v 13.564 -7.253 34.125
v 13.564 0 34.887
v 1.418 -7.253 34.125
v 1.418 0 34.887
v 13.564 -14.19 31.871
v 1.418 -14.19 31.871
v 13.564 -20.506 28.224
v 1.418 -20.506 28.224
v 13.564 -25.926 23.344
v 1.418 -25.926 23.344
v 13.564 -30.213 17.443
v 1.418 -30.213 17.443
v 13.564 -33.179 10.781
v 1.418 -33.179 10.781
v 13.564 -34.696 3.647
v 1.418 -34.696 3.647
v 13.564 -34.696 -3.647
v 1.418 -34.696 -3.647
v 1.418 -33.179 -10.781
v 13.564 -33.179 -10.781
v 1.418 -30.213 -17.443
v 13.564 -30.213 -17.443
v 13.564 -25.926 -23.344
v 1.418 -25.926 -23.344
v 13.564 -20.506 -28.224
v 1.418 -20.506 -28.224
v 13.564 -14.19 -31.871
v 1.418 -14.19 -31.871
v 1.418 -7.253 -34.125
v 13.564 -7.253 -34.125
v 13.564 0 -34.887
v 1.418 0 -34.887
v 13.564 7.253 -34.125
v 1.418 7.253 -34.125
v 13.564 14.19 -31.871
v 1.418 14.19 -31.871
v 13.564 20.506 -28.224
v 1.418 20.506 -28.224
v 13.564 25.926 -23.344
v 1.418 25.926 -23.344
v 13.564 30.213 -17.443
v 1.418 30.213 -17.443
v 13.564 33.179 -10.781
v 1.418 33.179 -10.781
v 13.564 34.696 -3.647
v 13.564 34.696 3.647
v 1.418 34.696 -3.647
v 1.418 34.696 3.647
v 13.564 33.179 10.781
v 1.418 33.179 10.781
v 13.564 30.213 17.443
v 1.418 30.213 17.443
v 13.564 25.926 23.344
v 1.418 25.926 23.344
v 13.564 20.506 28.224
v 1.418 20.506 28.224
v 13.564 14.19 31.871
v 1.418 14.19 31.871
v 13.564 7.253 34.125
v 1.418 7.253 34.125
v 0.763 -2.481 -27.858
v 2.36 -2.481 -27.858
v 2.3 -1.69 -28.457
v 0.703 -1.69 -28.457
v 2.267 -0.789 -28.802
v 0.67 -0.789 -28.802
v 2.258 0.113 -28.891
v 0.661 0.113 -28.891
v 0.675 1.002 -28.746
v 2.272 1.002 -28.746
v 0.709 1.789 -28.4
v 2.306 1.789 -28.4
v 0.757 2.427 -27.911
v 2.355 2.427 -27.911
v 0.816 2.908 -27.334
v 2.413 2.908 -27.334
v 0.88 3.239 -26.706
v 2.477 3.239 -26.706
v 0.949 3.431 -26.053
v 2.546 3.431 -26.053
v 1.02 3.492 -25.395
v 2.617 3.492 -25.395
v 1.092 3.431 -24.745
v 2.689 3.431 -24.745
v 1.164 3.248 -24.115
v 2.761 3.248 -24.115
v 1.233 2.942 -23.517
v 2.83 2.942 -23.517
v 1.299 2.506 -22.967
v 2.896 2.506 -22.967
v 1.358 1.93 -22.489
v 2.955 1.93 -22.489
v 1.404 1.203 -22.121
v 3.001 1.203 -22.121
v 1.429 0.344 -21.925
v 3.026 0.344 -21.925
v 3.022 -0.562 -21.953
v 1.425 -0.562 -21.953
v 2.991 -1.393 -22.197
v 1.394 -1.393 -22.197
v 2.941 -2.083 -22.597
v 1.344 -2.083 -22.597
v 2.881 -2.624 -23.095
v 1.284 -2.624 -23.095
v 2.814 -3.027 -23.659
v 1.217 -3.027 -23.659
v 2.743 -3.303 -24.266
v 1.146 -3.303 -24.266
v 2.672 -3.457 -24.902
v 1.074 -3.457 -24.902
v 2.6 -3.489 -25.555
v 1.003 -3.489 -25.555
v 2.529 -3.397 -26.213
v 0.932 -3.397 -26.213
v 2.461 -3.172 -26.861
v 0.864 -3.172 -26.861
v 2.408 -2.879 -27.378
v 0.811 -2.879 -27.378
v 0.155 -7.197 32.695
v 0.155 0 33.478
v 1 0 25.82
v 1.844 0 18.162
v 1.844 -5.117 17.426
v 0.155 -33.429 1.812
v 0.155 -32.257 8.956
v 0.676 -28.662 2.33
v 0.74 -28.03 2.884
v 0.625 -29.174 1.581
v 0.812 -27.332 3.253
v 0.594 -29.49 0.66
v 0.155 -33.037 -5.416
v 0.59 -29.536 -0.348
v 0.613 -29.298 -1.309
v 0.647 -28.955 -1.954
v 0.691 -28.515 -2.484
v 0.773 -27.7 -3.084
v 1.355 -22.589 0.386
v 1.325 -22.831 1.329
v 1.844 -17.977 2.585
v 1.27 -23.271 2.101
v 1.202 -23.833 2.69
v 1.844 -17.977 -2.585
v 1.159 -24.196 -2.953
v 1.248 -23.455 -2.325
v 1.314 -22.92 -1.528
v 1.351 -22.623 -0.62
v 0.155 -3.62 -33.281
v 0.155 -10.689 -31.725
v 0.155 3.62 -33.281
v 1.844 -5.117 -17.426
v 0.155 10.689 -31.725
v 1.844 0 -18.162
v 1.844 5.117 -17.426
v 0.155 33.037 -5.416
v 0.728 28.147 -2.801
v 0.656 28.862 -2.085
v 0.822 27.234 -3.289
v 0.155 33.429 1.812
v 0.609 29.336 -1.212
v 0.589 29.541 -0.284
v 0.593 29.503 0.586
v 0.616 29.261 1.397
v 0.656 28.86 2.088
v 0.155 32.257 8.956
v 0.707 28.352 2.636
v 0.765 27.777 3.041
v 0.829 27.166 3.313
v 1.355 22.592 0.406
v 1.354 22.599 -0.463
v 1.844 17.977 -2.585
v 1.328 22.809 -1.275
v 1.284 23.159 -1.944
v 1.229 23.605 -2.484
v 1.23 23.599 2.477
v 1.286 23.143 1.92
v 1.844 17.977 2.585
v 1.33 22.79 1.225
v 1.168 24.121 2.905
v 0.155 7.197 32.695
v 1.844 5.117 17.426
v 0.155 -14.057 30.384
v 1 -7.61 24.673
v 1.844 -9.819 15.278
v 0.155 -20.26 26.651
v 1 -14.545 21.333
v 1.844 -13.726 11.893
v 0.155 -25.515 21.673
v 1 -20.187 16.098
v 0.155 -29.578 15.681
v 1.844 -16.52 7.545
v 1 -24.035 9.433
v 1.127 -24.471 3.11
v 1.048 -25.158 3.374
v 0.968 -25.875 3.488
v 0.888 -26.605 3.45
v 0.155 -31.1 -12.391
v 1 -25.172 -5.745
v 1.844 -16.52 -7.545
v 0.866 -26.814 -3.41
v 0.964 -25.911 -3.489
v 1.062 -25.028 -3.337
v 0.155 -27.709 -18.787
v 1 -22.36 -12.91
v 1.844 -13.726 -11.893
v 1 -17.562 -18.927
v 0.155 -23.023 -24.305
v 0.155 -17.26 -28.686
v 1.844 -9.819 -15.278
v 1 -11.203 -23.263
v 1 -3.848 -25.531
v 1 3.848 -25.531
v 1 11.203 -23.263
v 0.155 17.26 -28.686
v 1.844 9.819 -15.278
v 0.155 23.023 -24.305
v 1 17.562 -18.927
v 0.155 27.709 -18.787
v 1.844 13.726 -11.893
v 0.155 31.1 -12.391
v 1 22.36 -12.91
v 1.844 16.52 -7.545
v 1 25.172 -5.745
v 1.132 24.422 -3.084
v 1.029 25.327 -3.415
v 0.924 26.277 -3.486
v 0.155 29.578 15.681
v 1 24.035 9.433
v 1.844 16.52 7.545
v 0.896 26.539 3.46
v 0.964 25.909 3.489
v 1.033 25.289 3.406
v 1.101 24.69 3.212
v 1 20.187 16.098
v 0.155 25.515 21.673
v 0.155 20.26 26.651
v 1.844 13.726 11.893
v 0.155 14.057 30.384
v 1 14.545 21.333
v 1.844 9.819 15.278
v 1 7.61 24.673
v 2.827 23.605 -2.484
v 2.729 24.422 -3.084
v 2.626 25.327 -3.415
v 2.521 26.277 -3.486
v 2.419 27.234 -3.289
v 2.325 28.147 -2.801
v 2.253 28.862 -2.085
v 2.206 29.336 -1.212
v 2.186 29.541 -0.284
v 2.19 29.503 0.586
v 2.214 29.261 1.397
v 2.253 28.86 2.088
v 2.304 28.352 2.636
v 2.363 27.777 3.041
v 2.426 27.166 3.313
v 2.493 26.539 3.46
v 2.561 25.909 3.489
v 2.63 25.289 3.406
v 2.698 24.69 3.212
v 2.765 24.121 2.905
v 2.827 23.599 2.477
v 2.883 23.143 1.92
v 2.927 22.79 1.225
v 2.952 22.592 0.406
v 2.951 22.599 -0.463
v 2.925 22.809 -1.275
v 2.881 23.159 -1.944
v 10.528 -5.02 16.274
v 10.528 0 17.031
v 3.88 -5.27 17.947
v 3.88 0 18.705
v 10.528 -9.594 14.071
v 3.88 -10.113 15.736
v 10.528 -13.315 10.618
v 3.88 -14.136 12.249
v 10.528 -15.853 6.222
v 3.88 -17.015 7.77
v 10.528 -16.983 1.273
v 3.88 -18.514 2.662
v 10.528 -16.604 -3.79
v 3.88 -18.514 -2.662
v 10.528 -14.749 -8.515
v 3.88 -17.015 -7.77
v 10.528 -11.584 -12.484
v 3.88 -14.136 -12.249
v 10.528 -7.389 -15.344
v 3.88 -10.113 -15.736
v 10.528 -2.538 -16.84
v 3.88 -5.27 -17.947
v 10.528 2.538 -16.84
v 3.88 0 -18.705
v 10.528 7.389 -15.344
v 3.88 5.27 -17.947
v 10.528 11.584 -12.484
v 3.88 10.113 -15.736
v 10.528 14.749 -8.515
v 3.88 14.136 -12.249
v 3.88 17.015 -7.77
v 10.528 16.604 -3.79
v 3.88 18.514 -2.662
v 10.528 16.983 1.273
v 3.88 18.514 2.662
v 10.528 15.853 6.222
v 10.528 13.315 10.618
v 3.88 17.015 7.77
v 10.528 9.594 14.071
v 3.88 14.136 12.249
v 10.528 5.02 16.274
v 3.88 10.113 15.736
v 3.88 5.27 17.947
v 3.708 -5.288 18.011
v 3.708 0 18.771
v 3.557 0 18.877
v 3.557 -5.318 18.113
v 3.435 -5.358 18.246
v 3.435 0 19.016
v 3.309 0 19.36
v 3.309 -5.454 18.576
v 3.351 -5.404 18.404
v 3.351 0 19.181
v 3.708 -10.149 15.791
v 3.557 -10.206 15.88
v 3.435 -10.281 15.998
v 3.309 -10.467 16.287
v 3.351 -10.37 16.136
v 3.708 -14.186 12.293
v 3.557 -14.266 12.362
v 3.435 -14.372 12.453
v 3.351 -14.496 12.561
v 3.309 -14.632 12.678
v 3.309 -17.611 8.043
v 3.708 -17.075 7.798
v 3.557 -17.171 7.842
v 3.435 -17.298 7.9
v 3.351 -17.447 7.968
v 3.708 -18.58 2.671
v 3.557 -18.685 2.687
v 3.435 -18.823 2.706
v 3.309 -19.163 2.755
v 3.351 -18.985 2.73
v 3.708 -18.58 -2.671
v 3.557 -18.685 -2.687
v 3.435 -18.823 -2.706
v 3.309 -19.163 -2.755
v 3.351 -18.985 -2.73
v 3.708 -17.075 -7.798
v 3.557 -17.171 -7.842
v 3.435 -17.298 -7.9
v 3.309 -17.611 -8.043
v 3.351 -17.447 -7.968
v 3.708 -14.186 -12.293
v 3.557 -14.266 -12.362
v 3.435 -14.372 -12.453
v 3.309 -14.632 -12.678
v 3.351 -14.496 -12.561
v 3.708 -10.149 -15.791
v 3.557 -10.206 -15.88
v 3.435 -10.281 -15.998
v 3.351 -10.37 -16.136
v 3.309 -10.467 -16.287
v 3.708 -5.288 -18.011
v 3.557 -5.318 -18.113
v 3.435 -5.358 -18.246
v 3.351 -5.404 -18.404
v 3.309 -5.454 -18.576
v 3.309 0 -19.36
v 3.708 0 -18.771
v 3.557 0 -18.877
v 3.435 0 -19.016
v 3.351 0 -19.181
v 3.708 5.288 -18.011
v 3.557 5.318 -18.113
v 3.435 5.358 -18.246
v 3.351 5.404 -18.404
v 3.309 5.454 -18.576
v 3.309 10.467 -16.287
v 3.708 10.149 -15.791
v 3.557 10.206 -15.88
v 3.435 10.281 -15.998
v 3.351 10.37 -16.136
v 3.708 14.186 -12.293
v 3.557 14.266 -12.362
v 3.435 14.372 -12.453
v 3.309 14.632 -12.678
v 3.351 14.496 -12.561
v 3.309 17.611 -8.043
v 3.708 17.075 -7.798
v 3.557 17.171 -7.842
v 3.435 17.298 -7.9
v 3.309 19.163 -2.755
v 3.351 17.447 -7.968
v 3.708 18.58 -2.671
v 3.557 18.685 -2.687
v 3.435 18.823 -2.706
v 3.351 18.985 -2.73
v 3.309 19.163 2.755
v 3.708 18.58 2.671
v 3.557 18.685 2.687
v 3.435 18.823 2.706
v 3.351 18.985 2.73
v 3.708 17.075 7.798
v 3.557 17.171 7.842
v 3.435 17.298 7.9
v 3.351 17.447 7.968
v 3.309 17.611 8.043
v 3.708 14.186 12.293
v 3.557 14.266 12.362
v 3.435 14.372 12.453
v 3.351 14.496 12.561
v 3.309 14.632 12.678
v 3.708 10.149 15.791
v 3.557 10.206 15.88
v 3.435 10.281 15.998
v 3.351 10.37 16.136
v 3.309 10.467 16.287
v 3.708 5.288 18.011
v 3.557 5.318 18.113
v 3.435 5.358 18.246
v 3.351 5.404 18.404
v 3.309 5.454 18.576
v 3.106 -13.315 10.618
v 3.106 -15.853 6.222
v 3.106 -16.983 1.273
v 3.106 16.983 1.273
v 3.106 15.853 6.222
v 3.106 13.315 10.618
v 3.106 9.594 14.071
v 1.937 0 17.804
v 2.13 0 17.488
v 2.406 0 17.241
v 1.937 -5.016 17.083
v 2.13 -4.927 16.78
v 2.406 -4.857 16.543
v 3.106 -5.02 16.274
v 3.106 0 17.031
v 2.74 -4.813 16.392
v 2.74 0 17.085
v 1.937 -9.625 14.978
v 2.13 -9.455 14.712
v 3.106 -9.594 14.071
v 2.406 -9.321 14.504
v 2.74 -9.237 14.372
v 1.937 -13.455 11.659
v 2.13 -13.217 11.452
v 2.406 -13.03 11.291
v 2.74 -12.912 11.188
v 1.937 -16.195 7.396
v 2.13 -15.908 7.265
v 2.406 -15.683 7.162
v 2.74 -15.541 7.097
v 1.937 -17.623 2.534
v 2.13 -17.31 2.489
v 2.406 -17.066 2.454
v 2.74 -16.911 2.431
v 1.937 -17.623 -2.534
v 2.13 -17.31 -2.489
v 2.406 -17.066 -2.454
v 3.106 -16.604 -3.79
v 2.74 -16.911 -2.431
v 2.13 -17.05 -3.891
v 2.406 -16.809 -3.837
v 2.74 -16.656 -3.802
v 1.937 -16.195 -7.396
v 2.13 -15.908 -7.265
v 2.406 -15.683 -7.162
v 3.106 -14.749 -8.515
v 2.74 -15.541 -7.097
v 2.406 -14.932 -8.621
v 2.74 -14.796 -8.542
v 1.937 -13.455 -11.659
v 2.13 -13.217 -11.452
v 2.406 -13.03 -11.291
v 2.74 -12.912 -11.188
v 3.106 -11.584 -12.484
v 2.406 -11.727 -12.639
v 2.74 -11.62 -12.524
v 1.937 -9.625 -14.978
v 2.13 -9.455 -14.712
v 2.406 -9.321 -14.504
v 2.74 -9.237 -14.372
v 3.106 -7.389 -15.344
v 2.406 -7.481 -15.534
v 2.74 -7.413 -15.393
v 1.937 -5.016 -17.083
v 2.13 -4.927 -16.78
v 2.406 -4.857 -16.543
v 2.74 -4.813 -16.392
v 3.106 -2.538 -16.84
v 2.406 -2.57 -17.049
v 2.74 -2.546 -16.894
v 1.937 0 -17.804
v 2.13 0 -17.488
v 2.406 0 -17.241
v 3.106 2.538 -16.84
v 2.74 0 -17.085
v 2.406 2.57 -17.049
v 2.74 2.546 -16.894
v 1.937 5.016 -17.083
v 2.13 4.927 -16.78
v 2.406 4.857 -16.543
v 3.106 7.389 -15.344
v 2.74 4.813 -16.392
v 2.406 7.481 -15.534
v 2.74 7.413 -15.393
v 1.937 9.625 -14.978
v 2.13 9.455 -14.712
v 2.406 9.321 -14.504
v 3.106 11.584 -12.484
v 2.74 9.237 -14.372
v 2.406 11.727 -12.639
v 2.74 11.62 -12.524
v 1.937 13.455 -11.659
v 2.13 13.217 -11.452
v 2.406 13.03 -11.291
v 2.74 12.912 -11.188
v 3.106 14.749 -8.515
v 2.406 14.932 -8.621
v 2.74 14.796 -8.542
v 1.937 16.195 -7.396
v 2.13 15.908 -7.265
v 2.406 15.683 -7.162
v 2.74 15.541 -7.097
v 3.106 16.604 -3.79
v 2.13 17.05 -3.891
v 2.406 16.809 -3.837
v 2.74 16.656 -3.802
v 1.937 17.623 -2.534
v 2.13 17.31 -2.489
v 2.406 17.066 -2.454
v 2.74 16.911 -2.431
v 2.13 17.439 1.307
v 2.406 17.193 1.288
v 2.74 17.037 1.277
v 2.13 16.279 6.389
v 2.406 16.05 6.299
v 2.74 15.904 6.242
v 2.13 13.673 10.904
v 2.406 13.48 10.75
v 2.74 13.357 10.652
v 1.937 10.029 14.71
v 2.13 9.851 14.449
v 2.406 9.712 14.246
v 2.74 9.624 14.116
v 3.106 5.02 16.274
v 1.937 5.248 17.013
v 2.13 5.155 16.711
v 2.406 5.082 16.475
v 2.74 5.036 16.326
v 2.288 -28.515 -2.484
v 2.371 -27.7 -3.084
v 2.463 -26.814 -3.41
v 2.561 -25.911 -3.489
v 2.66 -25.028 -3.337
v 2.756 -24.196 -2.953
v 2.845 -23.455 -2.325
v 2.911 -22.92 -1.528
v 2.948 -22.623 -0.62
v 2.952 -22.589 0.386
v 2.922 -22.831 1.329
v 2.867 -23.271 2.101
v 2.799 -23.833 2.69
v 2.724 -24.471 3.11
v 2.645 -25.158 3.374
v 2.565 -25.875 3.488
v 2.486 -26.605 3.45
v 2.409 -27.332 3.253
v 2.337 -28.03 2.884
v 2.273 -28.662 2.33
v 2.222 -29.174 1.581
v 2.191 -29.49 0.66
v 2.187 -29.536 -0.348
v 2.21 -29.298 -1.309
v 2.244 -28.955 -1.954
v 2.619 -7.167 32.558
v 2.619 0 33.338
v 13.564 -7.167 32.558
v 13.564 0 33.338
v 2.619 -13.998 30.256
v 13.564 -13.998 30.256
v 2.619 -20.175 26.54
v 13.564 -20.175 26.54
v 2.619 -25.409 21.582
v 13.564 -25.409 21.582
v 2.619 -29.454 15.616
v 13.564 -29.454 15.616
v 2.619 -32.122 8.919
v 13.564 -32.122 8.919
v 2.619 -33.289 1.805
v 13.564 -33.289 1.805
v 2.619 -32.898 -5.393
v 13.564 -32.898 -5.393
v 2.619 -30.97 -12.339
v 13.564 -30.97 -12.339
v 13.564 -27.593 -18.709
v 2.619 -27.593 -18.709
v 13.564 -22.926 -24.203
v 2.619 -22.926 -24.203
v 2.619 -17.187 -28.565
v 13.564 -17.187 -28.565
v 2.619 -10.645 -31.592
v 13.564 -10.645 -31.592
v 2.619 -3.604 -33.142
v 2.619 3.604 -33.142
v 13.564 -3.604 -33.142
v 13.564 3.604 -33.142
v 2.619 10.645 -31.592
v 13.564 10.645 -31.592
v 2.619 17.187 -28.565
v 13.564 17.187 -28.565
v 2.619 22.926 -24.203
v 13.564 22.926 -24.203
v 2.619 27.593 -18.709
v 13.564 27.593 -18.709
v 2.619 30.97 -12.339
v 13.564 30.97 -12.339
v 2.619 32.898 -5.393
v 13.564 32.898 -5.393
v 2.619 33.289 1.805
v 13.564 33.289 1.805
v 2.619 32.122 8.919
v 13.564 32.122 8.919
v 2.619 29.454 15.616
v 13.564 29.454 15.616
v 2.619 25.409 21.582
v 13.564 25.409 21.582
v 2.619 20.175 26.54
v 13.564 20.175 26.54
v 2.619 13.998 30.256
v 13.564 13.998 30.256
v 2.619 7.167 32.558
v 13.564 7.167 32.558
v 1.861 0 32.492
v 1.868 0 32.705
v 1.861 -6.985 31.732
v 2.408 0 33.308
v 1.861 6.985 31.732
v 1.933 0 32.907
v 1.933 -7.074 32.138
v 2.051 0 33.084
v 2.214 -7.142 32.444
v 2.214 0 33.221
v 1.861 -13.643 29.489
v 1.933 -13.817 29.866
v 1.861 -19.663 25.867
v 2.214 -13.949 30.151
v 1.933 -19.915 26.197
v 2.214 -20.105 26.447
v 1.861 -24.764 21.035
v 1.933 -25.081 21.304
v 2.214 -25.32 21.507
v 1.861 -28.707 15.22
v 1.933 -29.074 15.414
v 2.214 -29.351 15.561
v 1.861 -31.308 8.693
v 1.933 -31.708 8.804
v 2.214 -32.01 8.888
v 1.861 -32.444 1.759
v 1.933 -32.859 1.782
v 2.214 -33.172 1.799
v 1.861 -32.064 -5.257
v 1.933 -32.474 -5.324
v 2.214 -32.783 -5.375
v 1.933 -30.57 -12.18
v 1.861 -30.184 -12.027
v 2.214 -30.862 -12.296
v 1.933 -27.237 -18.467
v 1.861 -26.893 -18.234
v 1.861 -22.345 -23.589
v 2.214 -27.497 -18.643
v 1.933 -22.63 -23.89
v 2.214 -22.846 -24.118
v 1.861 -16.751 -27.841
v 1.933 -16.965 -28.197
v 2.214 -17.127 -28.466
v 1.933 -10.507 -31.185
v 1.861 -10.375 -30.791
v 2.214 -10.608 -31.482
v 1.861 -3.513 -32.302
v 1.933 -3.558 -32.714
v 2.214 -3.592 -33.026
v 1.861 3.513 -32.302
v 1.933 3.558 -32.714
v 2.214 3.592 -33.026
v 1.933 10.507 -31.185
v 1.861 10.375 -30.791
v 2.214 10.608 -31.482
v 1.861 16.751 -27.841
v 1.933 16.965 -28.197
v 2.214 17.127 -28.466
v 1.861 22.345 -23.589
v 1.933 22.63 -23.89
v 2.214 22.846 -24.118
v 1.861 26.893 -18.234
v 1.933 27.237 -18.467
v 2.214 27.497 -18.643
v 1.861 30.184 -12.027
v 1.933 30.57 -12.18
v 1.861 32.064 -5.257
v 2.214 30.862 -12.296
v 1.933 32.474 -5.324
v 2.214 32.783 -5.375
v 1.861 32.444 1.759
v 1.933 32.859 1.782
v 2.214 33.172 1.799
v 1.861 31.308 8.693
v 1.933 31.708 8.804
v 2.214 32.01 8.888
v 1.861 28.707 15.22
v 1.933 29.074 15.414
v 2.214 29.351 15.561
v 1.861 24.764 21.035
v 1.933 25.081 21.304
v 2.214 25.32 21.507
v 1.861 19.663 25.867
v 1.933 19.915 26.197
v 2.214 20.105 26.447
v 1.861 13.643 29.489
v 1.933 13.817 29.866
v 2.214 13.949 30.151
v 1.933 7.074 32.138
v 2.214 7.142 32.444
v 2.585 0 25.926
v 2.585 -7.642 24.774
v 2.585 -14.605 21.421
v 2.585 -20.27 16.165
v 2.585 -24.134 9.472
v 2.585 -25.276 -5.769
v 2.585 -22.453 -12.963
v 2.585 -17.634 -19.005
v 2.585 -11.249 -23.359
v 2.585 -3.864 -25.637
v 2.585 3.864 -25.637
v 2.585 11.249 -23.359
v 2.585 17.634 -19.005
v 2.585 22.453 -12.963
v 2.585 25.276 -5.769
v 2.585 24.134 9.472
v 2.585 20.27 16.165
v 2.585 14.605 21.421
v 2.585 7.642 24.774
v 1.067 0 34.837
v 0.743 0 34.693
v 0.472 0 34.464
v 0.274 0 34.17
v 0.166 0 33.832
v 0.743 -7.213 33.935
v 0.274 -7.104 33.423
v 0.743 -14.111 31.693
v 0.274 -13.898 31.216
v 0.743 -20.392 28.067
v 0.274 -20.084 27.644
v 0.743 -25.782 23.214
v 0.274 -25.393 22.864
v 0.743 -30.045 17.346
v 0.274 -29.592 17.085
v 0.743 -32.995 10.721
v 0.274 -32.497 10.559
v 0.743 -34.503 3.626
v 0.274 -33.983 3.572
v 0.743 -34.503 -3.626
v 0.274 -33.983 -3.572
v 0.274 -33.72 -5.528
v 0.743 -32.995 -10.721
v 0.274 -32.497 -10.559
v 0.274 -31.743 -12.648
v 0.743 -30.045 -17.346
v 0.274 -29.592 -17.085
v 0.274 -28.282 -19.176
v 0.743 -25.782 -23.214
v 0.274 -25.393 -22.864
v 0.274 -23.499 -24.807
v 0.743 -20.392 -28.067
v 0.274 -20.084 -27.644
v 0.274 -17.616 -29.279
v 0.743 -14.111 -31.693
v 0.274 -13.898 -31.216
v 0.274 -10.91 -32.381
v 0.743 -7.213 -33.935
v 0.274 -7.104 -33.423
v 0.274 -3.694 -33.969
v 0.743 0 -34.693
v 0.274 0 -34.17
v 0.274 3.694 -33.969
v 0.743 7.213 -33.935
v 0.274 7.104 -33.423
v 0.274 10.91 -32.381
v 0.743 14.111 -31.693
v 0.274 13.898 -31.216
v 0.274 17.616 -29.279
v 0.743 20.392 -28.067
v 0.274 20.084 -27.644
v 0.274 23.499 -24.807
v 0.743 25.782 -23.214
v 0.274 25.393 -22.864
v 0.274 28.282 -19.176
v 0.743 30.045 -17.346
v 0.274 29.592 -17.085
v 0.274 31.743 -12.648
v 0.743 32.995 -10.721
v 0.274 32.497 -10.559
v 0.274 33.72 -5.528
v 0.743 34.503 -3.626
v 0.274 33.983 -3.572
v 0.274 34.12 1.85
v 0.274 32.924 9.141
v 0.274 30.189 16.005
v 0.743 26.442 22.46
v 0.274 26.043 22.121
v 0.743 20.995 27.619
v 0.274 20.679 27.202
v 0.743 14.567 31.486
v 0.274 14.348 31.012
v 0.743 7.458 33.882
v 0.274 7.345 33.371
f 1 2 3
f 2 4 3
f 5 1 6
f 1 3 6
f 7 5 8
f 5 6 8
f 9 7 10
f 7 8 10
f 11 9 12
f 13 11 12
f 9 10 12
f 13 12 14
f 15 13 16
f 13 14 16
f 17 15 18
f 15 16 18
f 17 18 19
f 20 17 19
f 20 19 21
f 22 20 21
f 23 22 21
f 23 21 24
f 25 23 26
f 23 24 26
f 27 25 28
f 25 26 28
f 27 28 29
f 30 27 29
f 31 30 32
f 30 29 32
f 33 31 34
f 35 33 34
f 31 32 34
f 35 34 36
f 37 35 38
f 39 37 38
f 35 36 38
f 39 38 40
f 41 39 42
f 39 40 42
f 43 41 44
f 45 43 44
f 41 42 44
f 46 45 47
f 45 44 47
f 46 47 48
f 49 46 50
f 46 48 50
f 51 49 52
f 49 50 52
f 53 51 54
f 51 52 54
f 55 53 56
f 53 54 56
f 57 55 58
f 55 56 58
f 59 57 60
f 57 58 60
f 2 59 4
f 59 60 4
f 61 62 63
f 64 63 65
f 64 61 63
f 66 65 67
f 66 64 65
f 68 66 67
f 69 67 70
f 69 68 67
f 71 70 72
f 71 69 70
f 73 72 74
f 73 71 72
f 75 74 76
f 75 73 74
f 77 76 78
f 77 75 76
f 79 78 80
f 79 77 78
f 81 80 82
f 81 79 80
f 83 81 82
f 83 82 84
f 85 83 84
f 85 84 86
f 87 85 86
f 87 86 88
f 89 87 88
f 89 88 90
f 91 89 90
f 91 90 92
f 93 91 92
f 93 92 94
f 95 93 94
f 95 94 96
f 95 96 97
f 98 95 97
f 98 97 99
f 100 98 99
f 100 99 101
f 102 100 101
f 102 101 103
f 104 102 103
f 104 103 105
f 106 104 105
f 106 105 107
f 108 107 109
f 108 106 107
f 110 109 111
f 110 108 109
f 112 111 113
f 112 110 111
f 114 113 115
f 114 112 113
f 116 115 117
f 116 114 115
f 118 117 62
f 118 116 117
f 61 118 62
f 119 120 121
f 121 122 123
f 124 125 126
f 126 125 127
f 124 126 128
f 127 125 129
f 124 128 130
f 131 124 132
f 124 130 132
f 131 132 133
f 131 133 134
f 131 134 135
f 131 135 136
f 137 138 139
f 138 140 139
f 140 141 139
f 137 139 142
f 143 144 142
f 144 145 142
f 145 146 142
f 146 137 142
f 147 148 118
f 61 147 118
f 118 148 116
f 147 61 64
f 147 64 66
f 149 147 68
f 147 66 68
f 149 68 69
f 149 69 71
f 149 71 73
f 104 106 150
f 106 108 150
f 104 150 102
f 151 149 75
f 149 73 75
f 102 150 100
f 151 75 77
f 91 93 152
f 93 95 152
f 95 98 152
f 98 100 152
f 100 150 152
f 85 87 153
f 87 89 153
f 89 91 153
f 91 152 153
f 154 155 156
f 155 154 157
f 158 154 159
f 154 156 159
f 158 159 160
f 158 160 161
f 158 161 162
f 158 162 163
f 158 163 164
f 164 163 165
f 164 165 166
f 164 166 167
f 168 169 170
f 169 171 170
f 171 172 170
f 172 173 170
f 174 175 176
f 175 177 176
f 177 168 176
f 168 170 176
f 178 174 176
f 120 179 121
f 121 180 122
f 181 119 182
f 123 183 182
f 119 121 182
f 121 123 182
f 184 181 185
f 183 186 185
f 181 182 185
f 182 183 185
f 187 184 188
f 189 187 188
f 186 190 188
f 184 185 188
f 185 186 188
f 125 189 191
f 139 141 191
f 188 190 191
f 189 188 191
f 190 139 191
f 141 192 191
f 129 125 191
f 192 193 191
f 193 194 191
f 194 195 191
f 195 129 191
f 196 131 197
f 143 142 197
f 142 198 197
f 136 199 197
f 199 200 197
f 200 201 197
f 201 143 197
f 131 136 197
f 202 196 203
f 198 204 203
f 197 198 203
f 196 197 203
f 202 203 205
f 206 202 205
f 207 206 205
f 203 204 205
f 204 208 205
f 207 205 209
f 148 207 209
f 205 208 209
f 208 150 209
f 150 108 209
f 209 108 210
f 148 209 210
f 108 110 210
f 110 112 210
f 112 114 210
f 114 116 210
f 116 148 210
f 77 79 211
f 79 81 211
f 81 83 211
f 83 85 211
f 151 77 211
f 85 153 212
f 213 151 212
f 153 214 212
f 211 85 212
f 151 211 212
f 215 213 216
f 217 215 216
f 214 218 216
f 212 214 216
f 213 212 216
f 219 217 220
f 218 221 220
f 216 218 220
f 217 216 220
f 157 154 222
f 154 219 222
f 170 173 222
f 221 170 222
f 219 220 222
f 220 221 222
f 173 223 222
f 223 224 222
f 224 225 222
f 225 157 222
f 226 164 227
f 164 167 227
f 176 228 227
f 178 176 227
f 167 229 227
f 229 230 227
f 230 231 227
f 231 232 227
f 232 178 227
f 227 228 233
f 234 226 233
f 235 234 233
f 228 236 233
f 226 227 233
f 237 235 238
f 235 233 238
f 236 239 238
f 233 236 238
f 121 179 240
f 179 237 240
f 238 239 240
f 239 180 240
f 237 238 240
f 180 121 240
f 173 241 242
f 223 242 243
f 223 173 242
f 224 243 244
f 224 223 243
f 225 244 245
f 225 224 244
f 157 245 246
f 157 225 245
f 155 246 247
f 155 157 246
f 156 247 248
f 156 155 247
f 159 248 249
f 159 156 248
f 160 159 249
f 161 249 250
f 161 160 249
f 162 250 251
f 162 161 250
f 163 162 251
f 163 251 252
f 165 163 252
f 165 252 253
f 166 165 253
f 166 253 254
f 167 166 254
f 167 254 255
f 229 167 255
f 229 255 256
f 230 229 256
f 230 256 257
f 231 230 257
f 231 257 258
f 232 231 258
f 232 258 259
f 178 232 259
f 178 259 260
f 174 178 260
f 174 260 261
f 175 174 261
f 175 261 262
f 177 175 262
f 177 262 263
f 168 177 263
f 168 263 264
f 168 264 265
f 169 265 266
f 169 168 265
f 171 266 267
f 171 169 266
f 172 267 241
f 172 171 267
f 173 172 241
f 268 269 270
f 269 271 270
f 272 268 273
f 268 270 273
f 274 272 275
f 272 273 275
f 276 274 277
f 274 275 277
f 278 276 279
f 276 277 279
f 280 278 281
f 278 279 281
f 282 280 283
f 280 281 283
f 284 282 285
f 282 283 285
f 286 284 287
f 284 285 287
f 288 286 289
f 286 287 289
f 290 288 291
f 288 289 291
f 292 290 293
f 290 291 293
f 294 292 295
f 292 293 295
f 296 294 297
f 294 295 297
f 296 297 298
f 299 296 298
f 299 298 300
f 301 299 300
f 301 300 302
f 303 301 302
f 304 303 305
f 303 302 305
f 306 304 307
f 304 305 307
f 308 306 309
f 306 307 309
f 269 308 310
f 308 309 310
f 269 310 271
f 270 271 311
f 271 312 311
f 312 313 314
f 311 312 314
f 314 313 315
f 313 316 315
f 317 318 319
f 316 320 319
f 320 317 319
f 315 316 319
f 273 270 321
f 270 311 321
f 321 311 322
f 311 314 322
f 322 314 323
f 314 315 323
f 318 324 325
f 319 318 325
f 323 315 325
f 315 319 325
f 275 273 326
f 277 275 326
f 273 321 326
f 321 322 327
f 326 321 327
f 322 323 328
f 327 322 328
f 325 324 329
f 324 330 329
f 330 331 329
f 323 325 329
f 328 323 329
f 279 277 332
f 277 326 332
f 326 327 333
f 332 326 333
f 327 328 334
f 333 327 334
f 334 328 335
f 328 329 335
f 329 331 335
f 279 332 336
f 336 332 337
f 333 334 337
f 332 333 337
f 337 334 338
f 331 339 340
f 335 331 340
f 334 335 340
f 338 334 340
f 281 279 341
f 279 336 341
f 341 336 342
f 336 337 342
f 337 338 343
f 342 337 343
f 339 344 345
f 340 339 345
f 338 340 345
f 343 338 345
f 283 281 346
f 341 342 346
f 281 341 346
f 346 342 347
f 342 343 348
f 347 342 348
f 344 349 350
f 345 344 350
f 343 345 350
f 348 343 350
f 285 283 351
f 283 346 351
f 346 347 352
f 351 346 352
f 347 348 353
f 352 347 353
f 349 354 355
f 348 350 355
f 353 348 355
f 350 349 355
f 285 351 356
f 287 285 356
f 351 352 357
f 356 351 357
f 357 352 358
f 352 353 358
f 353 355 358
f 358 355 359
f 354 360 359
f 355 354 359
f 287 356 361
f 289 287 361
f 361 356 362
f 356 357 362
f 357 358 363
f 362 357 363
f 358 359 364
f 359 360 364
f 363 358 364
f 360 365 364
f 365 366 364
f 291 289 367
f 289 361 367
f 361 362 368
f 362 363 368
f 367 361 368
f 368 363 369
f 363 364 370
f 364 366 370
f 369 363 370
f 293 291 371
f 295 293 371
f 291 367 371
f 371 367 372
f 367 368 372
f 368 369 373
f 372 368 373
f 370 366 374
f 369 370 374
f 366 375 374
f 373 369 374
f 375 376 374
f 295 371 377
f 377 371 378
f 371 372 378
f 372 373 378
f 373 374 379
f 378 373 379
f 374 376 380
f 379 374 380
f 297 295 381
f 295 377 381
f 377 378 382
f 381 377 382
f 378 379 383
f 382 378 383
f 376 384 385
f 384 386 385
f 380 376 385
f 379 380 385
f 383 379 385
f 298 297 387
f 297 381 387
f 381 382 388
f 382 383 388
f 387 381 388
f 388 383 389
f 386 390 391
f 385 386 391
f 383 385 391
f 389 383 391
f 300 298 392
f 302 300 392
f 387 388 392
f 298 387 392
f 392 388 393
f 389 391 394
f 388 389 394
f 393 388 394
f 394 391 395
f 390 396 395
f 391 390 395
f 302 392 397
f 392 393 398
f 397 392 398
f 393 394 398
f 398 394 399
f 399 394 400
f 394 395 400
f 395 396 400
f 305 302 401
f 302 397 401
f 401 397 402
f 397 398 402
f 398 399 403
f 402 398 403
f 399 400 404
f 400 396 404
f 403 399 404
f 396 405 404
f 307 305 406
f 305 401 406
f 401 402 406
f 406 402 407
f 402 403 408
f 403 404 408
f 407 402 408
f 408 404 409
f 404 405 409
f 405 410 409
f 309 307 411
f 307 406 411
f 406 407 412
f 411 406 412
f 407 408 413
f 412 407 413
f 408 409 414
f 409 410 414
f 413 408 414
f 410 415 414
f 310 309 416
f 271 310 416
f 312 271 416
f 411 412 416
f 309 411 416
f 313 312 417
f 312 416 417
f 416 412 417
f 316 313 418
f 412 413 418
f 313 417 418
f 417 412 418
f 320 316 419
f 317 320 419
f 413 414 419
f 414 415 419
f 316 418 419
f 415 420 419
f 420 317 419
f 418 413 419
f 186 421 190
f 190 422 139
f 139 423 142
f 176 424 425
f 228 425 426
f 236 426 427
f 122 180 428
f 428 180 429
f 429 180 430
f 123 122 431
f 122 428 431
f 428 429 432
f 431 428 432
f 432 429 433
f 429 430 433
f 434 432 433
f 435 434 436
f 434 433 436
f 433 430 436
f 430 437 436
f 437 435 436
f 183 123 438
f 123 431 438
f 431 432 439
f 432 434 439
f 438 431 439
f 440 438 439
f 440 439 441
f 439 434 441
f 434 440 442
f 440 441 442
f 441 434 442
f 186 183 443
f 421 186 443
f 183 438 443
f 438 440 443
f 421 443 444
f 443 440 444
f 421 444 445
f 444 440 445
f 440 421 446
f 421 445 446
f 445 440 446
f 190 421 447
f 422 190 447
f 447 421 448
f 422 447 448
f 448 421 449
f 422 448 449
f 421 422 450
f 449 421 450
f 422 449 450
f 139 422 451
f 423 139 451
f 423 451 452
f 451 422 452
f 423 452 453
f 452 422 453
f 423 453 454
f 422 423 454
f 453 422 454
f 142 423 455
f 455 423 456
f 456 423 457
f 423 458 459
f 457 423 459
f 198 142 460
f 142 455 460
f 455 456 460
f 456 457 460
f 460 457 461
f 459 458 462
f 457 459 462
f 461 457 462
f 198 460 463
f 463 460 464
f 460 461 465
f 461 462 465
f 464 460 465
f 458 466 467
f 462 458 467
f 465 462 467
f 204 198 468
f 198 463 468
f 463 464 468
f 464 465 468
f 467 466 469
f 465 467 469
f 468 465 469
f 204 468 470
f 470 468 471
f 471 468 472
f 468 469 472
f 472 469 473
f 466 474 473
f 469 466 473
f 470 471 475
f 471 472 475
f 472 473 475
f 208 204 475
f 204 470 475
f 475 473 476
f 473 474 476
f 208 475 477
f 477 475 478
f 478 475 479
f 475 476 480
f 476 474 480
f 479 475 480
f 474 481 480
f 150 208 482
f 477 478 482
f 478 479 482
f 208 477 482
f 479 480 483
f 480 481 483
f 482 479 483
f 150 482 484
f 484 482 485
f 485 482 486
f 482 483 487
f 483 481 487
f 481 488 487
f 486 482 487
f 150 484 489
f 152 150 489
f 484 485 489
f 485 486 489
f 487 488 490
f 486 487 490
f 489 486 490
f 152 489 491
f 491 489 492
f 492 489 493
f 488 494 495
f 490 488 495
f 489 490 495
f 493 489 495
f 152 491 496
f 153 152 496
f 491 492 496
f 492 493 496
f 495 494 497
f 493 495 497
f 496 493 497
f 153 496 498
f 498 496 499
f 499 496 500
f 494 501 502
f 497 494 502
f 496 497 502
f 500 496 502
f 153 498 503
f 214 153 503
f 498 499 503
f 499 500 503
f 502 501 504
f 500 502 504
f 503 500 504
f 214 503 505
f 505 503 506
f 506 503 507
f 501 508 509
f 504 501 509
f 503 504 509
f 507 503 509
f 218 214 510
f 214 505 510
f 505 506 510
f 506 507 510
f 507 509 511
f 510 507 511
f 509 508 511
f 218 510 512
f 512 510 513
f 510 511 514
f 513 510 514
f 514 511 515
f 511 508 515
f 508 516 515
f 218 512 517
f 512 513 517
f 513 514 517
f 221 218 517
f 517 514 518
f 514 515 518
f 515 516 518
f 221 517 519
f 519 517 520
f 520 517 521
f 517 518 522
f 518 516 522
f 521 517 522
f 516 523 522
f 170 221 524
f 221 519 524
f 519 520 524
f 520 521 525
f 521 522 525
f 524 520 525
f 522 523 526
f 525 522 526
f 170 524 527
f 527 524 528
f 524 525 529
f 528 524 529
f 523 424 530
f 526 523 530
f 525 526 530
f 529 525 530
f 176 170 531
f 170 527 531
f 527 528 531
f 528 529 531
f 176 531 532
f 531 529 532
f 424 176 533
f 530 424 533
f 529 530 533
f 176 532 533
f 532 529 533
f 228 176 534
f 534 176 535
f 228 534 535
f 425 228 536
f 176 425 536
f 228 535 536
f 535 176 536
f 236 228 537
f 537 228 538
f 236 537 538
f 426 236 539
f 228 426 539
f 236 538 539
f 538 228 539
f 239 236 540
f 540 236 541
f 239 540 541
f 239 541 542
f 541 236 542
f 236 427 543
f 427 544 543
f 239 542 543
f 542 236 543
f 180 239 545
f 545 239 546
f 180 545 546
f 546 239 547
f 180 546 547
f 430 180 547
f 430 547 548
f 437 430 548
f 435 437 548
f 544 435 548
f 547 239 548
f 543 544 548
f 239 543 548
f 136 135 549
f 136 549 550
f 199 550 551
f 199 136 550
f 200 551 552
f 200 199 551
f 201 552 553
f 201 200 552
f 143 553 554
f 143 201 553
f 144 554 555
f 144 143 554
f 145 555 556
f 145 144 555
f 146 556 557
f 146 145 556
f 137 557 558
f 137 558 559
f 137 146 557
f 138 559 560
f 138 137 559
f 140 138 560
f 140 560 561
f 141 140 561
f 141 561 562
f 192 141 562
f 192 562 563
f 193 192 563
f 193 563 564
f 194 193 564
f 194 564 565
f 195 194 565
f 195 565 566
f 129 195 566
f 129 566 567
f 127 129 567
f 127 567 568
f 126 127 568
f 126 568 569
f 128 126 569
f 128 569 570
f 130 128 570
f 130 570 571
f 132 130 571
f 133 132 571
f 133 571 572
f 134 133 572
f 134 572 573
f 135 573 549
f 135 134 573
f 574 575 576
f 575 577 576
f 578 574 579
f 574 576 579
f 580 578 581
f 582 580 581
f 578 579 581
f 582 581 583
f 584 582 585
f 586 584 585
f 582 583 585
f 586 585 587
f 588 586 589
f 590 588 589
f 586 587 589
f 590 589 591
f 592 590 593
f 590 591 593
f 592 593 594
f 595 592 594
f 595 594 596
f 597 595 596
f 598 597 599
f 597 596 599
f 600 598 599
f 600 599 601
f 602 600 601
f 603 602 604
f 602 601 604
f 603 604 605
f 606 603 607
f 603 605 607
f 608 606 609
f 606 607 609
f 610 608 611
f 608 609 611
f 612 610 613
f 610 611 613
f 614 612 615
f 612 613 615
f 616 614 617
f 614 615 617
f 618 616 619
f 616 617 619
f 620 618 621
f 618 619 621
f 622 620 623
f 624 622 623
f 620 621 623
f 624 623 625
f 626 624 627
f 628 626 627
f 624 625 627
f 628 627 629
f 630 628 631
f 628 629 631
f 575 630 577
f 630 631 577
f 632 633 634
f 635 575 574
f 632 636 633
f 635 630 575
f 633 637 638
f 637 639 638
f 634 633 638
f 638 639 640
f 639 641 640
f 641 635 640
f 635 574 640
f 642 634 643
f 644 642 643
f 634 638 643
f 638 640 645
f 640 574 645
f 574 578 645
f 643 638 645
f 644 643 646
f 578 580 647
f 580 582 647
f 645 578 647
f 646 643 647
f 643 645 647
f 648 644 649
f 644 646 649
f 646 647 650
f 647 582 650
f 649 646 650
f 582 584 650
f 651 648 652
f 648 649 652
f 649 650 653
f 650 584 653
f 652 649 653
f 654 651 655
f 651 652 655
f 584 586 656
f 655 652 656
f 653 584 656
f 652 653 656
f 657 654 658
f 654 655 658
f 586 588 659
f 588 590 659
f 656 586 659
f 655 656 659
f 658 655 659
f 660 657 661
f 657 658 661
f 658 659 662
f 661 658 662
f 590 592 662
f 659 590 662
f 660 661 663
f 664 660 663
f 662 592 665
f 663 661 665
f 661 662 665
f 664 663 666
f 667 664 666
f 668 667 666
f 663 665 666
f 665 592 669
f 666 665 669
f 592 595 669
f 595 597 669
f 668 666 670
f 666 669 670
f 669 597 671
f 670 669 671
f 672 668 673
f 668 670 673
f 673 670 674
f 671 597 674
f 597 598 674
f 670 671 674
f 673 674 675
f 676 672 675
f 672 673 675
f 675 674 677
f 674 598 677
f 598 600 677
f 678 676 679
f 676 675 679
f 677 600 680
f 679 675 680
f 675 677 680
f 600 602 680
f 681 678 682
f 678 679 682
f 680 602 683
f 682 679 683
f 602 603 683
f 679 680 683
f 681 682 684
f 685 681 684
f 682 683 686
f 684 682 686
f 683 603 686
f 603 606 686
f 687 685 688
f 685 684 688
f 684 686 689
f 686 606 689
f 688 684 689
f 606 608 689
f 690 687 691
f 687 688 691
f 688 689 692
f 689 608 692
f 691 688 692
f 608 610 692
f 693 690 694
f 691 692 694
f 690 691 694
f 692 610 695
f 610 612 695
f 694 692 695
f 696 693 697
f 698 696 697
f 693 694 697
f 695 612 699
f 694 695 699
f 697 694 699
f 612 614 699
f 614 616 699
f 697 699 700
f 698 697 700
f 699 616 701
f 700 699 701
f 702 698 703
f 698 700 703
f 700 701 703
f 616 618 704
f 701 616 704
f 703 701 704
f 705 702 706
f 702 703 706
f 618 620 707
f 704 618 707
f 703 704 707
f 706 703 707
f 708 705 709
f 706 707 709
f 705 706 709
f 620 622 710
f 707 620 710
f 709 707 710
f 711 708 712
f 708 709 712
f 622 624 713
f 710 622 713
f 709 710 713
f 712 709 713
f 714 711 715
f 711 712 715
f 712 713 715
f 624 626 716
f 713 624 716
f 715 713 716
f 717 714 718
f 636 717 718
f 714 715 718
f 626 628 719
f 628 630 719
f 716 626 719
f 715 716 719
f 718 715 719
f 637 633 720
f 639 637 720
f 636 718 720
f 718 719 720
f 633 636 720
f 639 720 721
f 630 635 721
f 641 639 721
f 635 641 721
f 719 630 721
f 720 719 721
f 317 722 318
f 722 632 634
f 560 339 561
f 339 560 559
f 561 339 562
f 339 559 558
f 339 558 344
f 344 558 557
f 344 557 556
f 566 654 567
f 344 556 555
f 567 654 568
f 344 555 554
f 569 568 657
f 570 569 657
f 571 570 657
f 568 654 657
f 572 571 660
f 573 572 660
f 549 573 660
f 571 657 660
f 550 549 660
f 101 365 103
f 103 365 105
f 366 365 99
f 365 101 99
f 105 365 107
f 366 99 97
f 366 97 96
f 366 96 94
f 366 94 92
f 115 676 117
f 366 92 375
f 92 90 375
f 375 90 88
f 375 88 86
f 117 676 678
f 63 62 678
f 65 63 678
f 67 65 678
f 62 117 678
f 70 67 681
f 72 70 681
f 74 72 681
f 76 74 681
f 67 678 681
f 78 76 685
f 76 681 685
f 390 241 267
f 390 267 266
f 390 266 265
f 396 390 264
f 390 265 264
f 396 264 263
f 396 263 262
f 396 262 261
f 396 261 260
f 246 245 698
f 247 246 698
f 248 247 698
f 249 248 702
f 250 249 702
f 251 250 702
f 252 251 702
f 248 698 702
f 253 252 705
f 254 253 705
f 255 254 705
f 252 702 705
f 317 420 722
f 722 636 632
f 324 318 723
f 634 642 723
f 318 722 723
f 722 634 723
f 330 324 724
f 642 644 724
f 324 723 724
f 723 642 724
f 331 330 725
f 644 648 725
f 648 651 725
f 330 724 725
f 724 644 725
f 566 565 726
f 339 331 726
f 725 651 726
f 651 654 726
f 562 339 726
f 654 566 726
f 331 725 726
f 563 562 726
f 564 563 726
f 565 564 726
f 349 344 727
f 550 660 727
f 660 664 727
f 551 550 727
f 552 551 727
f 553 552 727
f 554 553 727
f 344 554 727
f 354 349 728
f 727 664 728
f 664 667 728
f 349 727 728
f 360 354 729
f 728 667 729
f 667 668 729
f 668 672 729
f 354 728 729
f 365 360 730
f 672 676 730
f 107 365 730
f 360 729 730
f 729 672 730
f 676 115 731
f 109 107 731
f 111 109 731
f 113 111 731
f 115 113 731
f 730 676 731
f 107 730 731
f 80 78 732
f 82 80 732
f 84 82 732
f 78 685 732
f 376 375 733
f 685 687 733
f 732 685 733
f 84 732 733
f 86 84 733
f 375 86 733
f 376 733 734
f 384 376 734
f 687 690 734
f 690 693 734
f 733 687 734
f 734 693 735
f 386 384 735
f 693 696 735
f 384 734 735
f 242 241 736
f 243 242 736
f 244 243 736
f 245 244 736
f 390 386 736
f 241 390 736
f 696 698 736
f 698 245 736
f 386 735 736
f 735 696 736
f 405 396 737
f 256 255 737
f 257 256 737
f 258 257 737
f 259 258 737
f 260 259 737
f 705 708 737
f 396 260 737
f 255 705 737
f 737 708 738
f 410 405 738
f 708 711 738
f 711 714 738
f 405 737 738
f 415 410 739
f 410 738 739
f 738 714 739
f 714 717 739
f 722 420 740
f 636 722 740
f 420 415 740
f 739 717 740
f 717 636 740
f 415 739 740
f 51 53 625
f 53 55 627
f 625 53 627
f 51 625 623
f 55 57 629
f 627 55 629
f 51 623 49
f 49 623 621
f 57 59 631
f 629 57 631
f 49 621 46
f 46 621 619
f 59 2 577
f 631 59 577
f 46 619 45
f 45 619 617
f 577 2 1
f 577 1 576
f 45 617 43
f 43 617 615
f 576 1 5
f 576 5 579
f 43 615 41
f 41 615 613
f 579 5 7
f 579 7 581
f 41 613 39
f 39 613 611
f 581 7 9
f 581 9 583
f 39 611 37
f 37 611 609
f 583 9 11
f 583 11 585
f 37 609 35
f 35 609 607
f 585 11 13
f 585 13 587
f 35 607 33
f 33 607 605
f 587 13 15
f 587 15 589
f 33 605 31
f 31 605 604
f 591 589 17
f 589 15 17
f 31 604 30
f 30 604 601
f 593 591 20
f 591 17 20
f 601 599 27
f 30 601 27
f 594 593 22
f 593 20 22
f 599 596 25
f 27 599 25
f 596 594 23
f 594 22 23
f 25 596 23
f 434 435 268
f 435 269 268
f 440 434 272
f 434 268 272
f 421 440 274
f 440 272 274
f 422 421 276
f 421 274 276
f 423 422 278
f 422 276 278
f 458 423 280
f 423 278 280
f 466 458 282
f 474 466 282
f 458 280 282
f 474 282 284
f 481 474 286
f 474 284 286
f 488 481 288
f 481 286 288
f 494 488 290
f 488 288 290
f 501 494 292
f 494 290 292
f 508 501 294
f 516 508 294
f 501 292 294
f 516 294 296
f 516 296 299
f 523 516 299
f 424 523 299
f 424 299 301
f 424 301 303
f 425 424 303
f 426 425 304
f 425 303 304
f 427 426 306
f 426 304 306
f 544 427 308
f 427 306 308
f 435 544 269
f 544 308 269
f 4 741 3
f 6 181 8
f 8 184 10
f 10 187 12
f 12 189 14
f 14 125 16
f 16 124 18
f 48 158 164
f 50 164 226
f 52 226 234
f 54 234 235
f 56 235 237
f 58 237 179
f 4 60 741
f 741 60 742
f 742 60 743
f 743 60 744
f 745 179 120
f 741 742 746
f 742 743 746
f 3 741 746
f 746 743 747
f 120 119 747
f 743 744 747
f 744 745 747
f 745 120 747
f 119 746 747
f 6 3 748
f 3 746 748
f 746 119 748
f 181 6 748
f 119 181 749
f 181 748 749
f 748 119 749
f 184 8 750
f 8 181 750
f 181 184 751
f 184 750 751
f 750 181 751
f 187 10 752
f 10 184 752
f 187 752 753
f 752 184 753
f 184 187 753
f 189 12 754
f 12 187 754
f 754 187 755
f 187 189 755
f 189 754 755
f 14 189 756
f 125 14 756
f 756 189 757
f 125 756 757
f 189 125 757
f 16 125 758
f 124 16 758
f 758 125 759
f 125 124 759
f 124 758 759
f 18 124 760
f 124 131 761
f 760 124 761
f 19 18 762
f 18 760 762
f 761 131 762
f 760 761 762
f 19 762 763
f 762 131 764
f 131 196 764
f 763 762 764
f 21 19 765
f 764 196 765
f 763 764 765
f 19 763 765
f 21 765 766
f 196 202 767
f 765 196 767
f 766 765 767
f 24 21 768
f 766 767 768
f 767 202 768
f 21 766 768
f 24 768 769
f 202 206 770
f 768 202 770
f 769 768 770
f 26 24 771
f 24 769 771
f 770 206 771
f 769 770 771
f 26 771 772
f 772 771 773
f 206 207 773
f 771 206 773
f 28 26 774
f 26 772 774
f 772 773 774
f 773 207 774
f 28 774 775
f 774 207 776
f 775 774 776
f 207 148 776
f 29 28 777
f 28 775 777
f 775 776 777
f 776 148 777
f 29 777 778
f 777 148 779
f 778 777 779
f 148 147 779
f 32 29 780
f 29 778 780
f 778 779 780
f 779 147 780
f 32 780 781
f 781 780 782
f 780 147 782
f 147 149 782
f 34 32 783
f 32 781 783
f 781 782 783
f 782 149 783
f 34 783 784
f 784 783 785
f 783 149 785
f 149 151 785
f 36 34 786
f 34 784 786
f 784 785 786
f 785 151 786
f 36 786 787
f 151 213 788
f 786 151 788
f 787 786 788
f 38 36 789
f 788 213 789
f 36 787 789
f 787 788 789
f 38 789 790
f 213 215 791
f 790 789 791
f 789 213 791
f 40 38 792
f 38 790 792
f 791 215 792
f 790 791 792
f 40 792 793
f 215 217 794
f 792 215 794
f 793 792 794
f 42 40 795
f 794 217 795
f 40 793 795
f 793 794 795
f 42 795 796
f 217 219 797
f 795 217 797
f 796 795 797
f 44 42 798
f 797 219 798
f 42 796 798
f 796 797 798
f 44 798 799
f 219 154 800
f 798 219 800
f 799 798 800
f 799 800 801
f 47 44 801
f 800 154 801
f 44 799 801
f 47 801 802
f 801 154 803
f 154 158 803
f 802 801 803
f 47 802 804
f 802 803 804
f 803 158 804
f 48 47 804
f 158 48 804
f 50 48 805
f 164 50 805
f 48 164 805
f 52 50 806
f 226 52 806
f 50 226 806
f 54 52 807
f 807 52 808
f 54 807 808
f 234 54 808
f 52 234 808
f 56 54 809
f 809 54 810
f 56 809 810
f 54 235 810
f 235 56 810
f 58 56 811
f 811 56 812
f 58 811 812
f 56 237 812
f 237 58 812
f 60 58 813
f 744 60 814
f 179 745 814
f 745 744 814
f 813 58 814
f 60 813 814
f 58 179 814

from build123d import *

# Parameters (mm, degrees)
SKETCH2_R          = 3.4925
CUT_EXTRUDE1_DEPTH = 52.167986429


with BuildPart() as part:
    # Sketch1 → Revolve1 (revolve)
    with BuildSketch(Plane.XY, mode=Mode.PRIVATE) as revolve1_sk:
        with BuildLine():
            Line((0.155348807, 33.477735982), (1.843834582, 18.161535982))
            ThreePointArc((1.843834582, 18.161535982), (2.258790389, 17.35475119), (3.106186901, 17.0307))
            Line((3.106186901, 17.0307), (10.5283, 17.0307))
            Line((10.5283, 17.0307), (3.88013628, 18.704834032))
            ThreePointArc((3.88013628, 18.704834032), (3.491808651, 18.943062367), (3.308801824, 19.360266859))
            Line((3.308801824, 19.360266859), (1.861135478, 32.492001589))
            ThreePointArc((1.861135478, 32.492001589), (2.050977583, 33.083937907), (2.618546869, 33.3375))
            Line((2.618546869, 33.3375), (13.5636, 33.3375))
            Line((13.5636, 33.3375), (13.5636, 34.8869))
            Line((13.5636, 34.8869), (1.417701126, 34.8869))
            ThreePointArc((1.417701126, 34.8869), (0.471752315, 34.464296512), (0.155348807, 33.477735982))
        make_face()
    revolve(revolve1_sk.sketch.rotate(Axis((-1000.538686221, 0, 0), (1, 0, 0)), 90), axis=Axis((-1000.538686221, 0, 0), (1, 0, 0)))

    # Sketch2 → Cut-Extrude1 (cut, through all)
    with BuildSketch(Plane(origin=(0, 0, 0), x_dir=(0, 0, -1), z_dir=(1, 0, 0))):
        with Locations(Location((0, -26.0604, 0), (0, 0, 315.343502334))):
            Circle(SKETCH2_R)
        with Locations(Location((0, 26.0604, 0), (0, 0, 315.324132172))):
            Circle(SKETCH2_R)
        with Locations(Location((25.4, 0, 0), (0, 0, 314.727093361))):
            Circle(SKETCH2_R)
    extrude(amount=CUT_EXTRUDE1_DEPTH, mode=Mode.SUBTRACT)


solid = part.part
